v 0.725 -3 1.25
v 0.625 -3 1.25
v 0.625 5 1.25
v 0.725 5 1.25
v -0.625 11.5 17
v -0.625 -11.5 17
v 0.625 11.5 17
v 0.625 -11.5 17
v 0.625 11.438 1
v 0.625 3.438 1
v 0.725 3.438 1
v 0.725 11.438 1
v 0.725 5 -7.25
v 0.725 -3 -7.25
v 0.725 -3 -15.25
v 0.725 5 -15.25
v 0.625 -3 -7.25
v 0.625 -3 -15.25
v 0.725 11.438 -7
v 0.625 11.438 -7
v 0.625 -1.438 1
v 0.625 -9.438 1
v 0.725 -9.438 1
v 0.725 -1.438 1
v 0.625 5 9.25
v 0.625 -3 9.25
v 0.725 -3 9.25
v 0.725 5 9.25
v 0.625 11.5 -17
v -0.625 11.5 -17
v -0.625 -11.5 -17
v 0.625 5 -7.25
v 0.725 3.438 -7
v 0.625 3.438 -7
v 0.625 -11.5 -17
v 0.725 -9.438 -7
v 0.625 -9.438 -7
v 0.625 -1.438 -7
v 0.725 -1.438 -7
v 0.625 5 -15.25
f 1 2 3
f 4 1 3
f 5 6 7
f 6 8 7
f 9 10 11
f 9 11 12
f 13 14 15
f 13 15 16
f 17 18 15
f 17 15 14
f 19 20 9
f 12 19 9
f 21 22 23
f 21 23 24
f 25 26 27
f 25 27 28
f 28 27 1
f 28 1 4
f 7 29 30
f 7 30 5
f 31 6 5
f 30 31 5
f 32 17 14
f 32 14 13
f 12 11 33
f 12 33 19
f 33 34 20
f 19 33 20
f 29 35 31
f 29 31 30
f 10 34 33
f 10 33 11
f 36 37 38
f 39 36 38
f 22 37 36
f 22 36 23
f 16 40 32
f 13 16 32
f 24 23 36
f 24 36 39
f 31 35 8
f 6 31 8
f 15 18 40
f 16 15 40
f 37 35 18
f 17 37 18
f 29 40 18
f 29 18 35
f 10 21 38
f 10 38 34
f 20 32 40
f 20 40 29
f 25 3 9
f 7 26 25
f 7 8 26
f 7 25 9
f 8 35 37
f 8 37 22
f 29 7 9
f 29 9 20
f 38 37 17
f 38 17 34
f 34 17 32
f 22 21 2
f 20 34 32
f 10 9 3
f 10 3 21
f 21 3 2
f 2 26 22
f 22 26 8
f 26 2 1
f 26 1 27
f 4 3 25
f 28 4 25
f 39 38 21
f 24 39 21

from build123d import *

# Parameters (mm, degrees)
F0_W     = 23
F0_H     = 34
F1_DEPTH = 0.625
F2_W     = 8
F2_H     = 8
F3_DEPTH = 0.1


with BuildPart() as f1:
    # F0 (on Right) → F1 (new body, symmetric)
    with BuildSketch(Plane.YZ):
        Rectangle(F0_W, F0_H)
    extrude(amount=F1_DEPTH, both=True)

    # F2 (on face) → F3 (join)
    with BuildSketch(Plane.YZ.offset(0.625)):
        with Locations((-5.4375, -3)):
            Rectangle(F2_W, F2_H)
        with Locations((7.4375, -3)):
            Rectangle(F2_W, F2_H)
        with Locations((1, 5.25)):
            Rectangle(F2_W, F2_H)
        with Locations((1, -11.25)):
            Rectangle(F2_W, F2_H)
    extrude(amount=F3_DEPTH)


solid = f1.part
